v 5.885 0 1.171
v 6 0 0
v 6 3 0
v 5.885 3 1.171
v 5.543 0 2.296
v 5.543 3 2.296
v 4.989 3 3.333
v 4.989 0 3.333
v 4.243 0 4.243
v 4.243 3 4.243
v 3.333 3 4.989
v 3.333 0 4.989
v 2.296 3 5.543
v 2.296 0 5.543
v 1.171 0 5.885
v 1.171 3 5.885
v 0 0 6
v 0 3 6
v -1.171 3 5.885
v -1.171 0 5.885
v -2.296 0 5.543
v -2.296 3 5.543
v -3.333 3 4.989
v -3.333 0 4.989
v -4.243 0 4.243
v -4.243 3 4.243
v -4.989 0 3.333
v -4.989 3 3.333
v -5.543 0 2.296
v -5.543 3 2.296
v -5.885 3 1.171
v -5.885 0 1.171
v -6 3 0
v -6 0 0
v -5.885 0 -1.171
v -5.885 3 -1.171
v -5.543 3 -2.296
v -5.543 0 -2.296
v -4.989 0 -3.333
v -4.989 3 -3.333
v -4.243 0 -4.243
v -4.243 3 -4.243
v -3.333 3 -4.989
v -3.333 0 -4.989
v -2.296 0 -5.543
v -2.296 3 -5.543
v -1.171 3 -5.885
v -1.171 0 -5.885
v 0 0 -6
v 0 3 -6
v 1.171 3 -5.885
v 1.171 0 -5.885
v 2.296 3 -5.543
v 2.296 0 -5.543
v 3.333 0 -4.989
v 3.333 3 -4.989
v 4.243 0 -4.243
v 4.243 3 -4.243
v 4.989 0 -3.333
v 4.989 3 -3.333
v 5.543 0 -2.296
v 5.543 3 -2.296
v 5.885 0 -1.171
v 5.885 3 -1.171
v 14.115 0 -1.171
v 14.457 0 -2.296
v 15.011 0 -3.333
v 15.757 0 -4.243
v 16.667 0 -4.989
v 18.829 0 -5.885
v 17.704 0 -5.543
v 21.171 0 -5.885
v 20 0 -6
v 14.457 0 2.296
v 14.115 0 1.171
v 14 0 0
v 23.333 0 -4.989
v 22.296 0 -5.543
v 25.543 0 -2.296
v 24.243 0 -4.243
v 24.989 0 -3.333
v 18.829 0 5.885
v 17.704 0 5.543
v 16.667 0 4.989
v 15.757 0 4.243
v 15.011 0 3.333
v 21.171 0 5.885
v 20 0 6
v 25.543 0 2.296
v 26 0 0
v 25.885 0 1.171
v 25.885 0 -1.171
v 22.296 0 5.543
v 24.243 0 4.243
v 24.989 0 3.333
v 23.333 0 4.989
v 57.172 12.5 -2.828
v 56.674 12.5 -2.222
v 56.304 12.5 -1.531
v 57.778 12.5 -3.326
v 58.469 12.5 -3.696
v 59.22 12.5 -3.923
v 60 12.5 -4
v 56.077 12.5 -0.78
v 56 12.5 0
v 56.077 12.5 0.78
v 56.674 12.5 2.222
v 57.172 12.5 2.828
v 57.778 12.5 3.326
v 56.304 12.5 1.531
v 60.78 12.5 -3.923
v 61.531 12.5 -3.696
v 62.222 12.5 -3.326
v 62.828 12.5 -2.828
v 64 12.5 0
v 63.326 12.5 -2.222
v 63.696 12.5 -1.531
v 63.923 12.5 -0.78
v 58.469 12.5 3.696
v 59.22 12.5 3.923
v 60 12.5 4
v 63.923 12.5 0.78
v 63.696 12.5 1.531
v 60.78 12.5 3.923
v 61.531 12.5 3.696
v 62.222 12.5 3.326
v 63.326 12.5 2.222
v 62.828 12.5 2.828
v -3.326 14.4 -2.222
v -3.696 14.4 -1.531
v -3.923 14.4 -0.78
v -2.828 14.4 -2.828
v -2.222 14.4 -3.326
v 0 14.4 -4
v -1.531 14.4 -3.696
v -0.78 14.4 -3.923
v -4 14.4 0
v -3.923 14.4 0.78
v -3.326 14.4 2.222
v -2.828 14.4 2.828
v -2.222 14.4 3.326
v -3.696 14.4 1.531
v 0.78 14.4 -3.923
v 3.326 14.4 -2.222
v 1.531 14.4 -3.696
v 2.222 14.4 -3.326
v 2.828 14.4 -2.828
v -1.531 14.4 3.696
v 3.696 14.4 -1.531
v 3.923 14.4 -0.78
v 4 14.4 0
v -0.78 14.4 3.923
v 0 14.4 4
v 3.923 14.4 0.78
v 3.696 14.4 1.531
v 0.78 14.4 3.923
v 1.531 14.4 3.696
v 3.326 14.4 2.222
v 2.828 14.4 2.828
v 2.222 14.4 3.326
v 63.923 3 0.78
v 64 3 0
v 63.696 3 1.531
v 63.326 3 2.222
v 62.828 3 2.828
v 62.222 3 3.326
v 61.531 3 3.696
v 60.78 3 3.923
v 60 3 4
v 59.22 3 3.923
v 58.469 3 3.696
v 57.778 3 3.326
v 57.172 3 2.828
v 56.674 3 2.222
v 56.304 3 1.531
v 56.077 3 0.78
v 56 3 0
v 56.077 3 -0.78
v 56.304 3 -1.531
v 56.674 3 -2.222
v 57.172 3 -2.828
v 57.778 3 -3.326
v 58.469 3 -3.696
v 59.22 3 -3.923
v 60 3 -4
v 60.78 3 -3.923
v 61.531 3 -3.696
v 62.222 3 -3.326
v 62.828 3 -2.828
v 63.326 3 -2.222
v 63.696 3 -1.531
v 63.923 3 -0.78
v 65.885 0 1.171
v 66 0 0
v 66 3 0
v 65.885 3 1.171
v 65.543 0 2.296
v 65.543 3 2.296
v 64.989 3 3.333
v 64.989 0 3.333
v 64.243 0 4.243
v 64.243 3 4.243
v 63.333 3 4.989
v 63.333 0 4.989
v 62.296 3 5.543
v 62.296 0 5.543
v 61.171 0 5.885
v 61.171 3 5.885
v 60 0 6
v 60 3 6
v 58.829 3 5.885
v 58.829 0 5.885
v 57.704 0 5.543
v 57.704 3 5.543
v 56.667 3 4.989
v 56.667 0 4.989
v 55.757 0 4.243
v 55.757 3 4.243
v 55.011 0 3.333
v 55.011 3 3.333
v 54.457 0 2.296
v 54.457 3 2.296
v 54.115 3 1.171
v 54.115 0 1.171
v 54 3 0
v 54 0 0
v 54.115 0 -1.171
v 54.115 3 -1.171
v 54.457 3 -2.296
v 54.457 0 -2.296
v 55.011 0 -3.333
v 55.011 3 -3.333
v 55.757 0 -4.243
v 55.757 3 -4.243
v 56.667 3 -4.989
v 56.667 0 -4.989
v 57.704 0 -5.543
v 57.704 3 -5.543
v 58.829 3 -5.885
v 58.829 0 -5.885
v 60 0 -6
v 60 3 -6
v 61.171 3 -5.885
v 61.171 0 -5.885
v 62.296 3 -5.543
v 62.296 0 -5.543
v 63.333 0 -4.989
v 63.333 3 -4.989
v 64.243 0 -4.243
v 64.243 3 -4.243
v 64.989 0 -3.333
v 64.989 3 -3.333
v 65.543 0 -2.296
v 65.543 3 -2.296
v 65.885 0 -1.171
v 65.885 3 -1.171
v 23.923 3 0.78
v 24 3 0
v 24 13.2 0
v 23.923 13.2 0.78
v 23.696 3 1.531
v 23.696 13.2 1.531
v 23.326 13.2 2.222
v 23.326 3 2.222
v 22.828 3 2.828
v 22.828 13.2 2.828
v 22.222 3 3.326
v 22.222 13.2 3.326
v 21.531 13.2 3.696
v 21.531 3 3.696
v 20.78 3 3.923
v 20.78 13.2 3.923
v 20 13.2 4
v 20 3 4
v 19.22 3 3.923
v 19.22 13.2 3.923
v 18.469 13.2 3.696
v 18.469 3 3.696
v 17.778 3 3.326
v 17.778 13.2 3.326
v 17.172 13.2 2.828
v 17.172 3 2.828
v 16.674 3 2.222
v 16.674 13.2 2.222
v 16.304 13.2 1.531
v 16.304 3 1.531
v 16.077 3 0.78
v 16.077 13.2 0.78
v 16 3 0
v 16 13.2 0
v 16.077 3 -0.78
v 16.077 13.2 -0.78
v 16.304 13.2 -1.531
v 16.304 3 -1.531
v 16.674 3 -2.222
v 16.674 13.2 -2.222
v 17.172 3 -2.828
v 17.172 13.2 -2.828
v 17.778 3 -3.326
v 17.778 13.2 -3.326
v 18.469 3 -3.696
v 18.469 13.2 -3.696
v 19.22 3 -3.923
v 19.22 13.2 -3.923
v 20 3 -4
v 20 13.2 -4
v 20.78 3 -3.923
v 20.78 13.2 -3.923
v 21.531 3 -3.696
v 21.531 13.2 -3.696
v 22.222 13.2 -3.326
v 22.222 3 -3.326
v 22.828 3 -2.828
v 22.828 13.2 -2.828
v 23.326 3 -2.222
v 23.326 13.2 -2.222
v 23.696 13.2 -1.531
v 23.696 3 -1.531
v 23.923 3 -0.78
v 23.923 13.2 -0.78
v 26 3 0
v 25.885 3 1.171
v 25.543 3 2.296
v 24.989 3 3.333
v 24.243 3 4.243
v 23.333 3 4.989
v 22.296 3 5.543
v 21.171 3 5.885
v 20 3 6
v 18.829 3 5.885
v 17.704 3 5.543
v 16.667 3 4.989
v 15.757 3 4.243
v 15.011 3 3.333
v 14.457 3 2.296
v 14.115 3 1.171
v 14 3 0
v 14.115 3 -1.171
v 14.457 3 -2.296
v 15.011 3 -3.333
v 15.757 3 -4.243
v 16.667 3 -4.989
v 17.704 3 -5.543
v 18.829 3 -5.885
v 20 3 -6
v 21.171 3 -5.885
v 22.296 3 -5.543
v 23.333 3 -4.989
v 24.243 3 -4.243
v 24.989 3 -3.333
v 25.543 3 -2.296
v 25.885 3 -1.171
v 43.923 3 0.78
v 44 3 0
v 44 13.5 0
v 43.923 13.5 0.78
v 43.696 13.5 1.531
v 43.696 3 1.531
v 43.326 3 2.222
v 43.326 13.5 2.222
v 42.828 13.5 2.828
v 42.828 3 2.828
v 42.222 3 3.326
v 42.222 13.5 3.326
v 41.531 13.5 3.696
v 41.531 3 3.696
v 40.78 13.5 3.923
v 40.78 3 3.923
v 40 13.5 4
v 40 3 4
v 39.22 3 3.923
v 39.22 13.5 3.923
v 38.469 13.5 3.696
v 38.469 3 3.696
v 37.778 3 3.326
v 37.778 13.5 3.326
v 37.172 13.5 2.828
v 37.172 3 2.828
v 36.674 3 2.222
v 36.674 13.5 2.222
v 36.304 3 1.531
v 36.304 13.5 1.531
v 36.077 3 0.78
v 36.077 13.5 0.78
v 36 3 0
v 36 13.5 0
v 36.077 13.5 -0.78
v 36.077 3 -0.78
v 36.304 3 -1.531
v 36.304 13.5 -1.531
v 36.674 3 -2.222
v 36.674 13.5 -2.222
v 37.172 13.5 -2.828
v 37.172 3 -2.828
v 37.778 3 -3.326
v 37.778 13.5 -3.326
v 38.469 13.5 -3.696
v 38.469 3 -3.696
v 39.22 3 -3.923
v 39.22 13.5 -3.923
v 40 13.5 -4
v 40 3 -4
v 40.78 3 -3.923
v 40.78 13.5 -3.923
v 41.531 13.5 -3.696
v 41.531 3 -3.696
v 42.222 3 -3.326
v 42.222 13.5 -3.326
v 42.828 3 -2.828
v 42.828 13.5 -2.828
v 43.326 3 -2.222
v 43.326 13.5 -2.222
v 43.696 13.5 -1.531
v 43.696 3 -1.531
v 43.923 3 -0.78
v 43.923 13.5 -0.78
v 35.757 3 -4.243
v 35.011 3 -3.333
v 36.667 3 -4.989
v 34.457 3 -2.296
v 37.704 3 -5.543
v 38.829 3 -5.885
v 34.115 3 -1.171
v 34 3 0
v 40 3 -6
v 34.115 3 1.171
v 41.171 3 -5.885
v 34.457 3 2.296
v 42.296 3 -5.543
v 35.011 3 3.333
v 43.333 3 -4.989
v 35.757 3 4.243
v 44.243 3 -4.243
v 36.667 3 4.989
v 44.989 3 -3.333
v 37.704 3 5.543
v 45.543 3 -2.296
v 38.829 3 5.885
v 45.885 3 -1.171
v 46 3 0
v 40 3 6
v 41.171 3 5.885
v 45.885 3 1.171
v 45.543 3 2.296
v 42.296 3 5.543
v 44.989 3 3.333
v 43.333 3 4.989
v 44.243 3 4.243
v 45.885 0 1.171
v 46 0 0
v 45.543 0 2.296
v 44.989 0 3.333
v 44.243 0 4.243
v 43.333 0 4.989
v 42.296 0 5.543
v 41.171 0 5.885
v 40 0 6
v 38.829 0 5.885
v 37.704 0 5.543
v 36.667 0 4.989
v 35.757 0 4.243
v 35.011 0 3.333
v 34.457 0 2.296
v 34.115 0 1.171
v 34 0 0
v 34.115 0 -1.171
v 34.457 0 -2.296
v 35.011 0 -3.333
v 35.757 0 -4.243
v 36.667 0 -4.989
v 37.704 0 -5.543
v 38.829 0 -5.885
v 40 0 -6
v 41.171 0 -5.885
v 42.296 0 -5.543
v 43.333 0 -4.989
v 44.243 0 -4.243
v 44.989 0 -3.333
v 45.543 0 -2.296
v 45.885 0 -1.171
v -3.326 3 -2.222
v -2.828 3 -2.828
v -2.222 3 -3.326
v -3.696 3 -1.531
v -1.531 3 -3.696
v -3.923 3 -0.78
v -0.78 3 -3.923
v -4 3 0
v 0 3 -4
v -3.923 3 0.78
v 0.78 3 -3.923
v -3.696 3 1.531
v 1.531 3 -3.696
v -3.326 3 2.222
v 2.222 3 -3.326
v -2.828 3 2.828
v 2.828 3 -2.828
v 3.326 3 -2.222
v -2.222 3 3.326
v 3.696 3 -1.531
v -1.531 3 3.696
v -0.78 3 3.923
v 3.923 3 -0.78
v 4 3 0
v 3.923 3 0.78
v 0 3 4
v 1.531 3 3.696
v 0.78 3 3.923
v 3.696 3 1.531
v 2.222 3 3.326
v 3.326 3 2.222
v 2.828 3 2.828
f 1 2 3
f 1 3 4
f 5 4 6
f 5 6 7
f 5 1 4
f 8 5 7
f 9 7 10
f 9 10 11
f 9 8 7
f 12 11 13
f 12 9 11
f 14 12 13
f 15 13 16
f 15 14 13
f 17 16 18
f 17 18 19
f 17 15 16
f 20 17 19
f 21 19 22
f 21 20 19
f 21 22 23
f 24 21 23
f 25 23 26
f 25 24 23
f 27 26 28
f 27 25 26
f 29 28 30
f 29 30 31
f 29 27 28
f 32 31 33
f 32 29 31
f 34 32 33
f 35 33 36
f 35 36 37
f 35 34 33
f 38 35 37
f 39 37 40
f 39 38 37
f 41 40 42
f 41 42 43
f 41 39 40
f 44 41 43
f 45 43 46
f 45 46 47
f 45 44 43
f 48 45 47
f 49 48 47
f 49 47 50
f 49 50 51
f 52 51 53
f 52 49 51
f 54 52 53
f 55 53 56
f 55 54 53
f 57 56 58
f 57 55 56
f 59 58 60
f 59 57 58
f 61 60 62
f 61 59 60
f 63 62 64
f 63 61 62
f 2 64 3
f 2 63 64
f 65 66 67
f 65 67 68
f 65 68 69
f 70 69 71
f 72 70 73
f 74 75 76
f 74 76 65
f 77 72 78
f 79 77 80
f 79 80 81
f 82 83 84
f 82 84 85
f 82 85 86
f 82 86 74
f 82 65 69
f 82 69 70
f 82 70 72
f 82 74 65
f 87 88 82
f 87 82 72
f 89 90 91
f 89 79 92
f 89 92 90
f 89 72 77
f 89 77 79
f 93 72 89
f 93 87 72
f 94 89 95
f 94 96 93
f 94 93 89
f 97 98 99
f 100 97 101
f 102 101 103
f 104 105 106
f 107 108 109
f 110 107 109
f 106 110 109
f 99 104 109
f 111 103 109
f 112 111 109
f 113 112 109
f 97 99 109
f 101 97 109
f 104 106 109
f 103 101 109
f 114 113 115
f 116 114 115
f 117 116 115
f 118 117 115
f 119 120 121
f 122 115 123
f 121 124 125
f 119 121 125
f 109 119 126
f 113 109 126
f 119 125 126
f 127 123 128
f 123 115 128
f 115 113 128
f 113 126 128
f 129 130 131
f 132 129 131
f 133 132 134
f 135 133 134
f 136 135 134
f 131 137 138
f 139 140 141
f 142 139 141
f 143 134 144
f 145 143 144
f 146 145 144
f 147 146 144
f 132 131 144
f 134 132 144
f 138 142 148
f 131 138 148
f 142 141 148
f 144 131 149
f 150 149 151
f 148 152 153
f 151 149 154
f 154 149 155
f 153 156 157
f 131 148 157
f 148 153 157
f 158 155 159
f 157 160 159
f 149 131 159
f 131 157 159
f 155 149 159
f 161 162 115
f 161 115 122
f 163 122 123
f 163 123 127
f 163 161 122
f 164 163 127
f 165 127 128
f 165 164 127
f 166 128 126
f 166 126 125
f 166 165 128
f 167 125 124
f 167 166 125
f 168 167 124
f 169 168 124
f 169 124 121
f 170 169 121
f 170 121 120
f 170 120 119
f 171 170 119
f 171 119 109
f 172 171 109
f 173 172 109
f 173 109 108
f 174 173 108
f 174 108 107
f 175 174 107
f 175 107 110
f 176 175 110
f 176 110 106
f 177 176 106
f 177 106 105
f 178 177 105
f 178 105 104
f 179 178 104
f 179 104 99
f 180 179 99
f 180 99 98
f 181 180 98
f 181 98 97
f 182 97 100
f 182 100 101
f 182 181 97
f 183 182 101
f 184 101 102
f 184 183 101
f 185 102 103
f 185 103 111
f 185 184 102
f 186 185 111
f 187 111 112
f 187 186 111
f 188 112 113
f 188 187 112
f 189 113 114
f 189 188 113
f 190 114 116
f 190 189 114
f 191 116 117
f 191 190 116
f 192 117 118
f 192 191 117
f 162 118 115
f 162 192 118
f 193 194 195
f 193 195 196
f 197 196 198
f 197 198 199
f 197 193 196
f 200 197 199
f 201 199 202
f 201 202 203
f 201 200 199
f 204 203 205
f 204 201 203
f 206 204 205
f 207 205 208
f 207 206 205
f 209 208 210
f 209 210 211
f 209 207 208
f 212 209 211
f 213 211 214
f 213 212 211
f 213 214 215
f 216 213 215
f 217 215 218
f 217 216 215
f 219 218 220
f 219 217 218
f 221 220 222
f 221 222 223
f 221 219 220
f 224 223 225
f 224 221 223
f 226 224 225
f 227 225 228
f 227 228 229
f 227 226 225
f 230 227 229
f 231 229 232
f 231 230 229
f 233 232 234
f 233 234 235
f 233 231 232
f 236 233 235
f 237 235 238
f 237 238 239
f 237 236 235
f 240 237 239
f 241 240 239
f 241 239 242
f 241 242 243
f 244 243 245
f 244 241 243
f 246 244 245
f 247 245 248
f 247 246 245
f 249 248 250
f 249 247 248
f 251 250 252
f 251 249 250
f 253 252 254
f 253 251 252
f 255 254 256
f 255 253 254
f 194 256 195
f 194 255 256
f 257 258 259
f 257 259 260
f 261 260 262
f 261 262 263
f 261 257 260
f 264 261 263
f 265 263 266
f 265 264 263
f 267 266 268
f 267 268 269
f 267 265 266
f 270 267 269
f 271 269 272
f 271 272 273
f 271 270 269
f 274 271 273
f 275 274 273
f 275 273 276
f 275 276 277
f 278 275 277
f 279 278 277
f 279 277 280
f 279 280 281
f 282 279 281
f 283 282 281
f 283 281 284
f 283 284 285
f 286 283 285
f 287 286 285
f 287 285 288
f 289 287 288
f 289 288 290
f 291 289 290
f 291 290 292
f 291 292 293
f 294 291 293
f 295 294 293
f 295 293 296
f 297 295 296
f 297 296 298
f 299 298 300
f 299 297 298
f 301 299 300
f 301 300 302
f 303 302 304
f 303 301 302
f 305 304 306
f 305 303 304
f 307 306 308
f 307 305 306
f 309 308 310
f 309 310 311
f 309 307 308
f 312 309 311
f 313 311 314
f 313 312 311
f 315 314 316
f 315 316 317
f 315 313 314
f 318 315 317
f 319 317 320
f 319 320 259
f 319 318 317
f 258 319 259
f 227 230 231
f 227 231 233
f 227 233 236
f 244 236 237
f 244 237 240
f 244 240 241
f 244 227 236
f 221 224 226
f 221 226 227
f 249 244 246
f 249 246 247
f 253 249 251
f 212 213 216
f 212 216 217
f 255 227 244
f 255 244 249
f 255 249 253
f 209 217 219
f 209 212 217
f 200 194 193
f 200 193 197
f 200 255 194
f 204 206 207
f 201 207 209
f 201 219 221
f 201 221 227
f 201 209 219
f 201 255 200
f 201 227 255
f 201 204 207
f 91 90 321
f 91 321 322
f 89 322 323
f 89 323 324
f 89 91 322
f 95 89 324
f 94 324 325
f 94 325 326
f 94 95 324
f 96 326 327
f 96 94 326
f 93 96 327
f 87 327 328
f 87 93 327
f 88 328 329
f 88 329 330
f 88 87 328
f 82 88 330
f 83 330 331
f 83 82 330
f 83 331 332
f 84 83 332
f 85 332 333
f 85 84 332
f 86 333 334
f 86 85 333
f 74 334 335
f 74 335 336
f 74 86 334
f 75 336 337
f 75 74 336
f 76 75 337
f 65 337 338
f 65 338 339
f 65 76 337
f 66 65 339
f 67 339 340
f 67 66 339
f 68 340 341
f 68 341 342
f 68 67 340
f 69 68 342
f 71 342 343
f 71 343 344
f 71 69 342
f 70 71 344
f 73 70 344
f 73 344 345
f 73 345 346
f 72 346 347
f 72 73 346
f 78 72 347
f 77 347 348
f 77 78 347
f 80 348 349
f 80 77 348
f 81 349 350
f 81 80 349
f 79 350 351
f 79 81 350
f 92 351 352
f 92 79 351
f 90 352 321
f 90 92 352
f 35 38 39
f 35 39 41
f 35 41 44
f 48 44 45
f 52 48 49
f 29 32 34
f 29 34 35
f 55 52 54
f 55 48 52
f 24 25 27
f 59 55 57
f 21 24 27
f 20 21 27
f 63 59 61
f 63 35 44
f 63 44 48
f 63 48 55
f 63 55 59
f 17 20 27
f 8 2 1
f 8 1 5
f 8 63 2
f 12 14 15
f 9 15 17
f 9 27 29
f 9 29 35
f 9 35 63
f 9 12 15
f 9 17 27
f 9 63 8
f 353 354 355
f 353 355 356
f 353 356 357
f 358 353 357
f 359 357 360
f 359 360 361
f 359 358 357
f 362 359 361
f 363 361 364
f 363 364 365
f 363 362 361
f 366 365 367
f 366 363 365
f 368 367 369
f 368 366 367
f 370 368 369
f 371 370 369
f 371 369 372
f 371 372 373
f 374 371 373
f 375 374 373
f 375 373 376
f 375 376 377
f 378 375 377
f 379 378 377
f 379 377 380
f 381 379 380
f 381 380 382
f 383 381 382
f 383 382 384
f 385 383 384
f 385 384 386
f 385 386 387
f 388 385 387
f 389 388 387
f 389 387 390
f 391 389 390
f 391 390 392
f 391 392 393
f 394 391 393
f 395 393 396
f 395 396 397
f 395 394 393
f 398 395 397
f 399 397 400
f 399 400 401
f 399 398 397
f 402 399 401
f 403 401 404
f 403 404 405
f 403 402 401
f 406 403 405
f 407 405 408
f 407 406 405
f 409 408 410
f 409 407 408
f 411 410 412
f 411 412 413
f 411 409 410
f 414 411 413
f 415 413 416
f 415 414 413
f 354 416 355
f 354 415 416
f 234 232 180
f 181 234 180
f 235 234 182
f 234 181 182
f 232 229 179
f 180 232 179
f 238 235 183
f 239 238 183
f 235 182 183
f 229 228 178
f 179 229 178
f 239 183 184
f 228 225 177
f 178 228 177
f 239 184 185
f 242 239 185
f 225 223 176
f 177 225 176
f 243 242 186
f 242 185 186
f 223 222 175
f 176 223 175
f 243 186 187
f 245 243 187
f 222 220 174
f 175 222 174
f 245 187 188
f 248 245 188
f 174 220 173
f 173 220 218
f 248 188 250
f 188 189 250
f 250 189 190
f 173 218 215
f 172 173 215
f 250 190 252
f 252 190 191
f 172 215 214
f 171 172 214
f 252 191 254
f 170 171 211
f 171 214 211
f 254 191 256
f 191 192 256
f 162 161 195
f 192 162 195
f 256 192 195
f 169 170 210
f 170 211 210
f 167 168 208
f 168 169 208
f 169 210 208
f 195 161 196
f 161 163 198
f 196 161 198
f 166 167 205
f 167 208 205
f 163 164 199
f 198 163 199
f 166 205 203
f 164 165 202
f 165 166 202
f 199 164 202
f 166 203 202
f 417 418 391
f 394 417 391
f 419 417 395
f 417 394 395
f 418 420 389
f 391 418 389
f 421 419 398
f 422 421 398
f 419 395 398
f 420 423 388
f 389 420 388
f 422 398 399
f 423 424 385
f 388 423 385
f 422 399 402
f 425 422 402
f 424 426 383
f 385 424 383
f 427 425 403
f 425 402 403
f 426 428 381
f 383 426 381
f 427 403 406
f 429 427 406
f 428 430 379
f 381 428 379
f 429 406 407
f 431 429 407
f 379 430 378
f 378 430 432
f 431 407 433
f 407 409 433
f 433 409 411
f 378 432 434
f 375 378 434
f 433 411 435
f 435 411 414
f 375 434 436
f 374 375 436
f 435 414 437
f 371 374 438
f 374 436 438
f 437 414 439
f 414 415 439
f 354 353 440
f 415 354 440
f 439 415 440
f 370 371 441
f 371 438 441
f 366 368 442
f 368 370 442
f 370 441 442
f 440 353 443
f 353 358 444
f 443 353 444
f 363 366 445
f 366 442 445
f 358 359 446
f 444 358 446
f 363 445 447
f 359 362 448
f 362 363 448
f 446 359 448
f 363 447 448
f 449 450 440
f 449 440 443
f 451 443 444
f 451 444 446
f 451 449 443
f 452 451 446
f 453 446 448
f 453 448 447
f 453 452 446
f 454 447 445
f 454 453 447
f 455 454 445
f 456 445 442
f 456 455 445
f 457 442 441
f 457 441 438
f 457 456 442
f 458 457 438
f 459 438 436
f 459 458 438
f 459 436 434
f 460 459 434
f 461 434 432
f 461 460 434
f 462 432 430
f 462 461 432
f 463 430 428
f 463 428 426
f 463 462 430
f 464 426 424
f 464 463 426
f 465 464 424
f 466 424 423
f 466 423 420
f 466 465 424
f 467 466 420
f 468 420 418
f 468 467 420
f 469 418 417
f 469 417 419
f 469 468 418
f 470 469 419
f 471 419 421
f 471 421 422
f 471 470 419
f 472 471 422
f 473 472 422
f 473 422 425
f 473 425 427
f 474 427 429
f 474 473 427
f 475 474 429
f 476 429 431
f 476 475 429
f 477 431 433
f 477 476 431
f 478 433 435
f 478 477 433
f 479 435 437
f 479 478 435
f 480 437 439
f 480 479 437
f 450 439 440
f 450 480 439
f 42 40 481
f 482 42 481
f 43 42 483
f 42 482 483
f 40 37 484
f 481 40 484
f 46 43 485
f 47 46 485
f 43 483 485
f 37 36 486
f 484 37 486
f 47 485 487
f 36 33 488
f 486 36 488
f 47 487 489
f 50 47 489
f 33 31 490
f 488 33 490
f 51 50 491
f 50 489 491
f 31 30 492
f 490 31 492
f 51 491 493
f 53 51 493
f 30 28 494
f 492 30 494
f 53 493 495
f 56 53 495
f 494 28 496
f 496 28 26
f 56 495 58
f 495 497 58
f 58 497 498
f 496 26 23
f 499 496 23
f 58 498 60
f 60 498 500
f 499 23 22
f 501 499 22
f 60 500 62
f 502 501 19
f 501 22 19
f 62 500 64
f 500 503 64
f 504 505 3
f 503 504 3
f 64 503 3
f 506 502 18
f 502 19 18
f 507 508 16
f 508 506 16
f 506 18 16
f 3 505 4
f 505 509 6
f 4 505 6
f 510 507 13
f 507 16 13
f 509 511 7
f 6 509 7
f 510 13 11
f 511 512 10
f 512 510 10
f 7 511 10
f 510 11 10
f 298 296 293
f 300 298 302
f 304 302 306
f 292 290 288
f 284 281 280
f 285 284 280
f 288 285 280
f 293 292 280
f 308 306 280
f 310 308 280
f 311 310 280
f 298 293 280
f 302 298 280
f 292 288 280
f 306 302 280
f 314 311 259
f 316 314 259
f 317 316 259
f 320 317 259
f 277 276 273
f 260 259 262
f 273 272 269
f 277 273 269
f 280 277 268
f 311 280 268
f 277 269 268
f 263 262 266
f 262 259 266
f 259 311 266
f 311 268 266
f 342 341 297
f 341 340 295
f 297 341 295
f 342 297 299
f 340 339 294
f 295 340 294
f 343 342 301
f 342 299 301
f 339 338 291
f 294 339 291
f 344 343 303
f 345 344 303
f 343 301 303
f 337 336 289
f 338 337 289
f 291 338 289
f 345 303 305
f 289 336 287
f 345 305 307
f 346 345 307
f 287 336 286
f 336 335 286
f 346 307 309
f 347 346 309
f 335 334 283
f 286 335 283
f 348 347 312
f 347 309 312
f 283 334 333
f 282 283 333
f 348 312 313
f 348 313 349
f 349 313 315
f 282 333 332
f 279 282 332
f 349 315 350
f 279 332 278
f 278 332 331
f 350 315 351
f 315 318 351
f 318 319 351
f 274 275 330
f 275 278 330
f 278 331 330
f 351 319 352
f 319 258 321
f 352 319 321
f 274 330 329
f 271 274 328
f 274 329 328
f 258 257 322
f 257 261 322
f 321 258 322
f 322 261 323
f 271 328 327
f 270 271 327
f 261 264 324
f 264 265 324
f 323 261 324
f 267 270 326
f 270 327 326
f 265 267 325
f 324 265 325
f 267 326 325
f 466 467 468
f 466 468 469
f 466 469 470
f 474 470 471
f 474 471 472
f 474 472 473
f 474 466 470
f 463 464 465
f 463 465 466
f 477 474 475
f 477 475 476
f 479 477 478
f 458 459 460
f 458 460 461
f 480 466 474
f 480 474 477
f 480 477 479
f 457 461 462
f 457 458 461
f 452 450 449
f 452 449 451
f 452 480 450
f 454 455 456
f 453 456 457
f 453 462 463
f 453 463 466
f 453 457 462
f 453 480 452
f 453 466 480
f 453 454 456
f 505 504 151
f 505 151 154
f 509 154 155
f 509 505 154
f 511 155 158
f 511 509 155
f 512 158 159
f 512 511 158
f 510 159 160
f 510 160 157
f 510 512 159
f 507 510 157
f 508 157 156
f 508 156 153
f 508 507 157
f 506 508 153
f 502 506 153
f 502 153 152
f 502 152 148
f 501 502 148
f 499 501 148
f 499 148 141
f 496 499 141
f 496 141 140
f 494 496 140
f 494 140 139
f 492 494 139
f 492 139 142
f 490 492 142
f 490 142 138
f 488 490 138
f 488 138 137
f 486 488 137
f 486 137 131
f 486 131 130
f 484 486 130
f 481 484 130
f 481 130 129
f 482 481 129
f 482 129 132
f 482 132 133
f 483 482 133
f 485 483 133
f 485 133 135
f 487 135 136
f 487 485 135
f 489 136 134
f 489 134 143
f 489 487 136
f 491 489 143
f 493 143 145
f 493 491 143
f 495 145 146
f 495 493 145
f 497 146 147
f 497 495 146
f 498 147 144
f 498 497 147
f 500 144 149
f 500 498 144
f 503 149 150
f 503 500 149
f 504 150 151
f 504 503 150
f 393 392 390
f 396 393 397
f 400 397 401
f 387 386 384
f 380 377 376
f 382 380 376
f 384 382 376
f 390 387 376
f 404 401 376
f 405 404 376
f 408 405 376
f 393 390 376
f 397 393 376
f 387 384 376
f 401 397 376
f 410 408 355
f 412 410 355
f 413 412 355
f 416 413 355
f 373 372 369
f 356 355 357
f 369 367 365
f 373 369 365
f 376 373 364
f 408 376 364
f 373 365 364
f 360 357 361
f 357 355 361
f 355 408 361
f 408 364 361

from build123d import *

# Parameters (mm, degrees)
F0_R     = 4
F1_DEPTH = 14.4
F2_DEPTH = 13.2
F3_DEPTH = 13.5
F4_DEPTH = 12.5
F0_R_2   = 6
F5_DEPTH = 3


with BuildPart() as f1:
    # F0 (on Front) → F1 (new body)
    with BuildSketch(Plane.XZ):
        Circle(F0_R)
    extrude(amount=-F1_DEPTH)



with BuildPart() as f2:
    # F0 (on Front) → F2 (new body)
    with BuildSketch(Plane.XZ):
        with Locations((20, 0)):
            Circle(F0_R)
    extrude(amount=-F2_DEPTH)


with BuildPart() as f3:
    # F0 (on Front) → F3 (new body)
    with BuildSketch(Plane.XZ):
        with Locations((40, 0)):
            Circle(F0_R)
    extrude(amount=-F3_DEPTH)


with BuildPart() as f4:
    # F0 (on Front) → F4 (new body)
    with BuildSketch(Plane.XZ):
        with Locations((60, 0)):
            Circle(F0_R)
    extrude(amount=-F4_DEPTH)


with BuildPart() as f1_1:
    add(f1.part)

    add(f2.part)  # F5 merges F2

    add(f3.part)  # F5 merges F3

    add(f4.part)  # F5 merges F4
    # F0 (on Front) → F5 (join)
    with BuildSketch(Plane.XZ):
        with Locations((40, 0)):
            Circle(F0_R_2)
        with Locations((40, 0)):
            Circle(F0_R, mode=Mode.SUBTRACT)
        with Locations((20, 0)):
            Circle(F0_R_2)
        with Locations((20, 0)):
            Circle(F0_R, mode=Mode.SUBTRACT)
        Circle(F0_R_2)
        Circle(F0_R, mode=Mode.SUBTRACT)
        with Locations((60, 0)):
            Circle(F0_R_2)
        with Locations((60, 0)):
            Circle(F0_R, mode=Mode.SUBTRACT)
    extrude(amount=-F5_DEPTH)


solid = f1_1.part
